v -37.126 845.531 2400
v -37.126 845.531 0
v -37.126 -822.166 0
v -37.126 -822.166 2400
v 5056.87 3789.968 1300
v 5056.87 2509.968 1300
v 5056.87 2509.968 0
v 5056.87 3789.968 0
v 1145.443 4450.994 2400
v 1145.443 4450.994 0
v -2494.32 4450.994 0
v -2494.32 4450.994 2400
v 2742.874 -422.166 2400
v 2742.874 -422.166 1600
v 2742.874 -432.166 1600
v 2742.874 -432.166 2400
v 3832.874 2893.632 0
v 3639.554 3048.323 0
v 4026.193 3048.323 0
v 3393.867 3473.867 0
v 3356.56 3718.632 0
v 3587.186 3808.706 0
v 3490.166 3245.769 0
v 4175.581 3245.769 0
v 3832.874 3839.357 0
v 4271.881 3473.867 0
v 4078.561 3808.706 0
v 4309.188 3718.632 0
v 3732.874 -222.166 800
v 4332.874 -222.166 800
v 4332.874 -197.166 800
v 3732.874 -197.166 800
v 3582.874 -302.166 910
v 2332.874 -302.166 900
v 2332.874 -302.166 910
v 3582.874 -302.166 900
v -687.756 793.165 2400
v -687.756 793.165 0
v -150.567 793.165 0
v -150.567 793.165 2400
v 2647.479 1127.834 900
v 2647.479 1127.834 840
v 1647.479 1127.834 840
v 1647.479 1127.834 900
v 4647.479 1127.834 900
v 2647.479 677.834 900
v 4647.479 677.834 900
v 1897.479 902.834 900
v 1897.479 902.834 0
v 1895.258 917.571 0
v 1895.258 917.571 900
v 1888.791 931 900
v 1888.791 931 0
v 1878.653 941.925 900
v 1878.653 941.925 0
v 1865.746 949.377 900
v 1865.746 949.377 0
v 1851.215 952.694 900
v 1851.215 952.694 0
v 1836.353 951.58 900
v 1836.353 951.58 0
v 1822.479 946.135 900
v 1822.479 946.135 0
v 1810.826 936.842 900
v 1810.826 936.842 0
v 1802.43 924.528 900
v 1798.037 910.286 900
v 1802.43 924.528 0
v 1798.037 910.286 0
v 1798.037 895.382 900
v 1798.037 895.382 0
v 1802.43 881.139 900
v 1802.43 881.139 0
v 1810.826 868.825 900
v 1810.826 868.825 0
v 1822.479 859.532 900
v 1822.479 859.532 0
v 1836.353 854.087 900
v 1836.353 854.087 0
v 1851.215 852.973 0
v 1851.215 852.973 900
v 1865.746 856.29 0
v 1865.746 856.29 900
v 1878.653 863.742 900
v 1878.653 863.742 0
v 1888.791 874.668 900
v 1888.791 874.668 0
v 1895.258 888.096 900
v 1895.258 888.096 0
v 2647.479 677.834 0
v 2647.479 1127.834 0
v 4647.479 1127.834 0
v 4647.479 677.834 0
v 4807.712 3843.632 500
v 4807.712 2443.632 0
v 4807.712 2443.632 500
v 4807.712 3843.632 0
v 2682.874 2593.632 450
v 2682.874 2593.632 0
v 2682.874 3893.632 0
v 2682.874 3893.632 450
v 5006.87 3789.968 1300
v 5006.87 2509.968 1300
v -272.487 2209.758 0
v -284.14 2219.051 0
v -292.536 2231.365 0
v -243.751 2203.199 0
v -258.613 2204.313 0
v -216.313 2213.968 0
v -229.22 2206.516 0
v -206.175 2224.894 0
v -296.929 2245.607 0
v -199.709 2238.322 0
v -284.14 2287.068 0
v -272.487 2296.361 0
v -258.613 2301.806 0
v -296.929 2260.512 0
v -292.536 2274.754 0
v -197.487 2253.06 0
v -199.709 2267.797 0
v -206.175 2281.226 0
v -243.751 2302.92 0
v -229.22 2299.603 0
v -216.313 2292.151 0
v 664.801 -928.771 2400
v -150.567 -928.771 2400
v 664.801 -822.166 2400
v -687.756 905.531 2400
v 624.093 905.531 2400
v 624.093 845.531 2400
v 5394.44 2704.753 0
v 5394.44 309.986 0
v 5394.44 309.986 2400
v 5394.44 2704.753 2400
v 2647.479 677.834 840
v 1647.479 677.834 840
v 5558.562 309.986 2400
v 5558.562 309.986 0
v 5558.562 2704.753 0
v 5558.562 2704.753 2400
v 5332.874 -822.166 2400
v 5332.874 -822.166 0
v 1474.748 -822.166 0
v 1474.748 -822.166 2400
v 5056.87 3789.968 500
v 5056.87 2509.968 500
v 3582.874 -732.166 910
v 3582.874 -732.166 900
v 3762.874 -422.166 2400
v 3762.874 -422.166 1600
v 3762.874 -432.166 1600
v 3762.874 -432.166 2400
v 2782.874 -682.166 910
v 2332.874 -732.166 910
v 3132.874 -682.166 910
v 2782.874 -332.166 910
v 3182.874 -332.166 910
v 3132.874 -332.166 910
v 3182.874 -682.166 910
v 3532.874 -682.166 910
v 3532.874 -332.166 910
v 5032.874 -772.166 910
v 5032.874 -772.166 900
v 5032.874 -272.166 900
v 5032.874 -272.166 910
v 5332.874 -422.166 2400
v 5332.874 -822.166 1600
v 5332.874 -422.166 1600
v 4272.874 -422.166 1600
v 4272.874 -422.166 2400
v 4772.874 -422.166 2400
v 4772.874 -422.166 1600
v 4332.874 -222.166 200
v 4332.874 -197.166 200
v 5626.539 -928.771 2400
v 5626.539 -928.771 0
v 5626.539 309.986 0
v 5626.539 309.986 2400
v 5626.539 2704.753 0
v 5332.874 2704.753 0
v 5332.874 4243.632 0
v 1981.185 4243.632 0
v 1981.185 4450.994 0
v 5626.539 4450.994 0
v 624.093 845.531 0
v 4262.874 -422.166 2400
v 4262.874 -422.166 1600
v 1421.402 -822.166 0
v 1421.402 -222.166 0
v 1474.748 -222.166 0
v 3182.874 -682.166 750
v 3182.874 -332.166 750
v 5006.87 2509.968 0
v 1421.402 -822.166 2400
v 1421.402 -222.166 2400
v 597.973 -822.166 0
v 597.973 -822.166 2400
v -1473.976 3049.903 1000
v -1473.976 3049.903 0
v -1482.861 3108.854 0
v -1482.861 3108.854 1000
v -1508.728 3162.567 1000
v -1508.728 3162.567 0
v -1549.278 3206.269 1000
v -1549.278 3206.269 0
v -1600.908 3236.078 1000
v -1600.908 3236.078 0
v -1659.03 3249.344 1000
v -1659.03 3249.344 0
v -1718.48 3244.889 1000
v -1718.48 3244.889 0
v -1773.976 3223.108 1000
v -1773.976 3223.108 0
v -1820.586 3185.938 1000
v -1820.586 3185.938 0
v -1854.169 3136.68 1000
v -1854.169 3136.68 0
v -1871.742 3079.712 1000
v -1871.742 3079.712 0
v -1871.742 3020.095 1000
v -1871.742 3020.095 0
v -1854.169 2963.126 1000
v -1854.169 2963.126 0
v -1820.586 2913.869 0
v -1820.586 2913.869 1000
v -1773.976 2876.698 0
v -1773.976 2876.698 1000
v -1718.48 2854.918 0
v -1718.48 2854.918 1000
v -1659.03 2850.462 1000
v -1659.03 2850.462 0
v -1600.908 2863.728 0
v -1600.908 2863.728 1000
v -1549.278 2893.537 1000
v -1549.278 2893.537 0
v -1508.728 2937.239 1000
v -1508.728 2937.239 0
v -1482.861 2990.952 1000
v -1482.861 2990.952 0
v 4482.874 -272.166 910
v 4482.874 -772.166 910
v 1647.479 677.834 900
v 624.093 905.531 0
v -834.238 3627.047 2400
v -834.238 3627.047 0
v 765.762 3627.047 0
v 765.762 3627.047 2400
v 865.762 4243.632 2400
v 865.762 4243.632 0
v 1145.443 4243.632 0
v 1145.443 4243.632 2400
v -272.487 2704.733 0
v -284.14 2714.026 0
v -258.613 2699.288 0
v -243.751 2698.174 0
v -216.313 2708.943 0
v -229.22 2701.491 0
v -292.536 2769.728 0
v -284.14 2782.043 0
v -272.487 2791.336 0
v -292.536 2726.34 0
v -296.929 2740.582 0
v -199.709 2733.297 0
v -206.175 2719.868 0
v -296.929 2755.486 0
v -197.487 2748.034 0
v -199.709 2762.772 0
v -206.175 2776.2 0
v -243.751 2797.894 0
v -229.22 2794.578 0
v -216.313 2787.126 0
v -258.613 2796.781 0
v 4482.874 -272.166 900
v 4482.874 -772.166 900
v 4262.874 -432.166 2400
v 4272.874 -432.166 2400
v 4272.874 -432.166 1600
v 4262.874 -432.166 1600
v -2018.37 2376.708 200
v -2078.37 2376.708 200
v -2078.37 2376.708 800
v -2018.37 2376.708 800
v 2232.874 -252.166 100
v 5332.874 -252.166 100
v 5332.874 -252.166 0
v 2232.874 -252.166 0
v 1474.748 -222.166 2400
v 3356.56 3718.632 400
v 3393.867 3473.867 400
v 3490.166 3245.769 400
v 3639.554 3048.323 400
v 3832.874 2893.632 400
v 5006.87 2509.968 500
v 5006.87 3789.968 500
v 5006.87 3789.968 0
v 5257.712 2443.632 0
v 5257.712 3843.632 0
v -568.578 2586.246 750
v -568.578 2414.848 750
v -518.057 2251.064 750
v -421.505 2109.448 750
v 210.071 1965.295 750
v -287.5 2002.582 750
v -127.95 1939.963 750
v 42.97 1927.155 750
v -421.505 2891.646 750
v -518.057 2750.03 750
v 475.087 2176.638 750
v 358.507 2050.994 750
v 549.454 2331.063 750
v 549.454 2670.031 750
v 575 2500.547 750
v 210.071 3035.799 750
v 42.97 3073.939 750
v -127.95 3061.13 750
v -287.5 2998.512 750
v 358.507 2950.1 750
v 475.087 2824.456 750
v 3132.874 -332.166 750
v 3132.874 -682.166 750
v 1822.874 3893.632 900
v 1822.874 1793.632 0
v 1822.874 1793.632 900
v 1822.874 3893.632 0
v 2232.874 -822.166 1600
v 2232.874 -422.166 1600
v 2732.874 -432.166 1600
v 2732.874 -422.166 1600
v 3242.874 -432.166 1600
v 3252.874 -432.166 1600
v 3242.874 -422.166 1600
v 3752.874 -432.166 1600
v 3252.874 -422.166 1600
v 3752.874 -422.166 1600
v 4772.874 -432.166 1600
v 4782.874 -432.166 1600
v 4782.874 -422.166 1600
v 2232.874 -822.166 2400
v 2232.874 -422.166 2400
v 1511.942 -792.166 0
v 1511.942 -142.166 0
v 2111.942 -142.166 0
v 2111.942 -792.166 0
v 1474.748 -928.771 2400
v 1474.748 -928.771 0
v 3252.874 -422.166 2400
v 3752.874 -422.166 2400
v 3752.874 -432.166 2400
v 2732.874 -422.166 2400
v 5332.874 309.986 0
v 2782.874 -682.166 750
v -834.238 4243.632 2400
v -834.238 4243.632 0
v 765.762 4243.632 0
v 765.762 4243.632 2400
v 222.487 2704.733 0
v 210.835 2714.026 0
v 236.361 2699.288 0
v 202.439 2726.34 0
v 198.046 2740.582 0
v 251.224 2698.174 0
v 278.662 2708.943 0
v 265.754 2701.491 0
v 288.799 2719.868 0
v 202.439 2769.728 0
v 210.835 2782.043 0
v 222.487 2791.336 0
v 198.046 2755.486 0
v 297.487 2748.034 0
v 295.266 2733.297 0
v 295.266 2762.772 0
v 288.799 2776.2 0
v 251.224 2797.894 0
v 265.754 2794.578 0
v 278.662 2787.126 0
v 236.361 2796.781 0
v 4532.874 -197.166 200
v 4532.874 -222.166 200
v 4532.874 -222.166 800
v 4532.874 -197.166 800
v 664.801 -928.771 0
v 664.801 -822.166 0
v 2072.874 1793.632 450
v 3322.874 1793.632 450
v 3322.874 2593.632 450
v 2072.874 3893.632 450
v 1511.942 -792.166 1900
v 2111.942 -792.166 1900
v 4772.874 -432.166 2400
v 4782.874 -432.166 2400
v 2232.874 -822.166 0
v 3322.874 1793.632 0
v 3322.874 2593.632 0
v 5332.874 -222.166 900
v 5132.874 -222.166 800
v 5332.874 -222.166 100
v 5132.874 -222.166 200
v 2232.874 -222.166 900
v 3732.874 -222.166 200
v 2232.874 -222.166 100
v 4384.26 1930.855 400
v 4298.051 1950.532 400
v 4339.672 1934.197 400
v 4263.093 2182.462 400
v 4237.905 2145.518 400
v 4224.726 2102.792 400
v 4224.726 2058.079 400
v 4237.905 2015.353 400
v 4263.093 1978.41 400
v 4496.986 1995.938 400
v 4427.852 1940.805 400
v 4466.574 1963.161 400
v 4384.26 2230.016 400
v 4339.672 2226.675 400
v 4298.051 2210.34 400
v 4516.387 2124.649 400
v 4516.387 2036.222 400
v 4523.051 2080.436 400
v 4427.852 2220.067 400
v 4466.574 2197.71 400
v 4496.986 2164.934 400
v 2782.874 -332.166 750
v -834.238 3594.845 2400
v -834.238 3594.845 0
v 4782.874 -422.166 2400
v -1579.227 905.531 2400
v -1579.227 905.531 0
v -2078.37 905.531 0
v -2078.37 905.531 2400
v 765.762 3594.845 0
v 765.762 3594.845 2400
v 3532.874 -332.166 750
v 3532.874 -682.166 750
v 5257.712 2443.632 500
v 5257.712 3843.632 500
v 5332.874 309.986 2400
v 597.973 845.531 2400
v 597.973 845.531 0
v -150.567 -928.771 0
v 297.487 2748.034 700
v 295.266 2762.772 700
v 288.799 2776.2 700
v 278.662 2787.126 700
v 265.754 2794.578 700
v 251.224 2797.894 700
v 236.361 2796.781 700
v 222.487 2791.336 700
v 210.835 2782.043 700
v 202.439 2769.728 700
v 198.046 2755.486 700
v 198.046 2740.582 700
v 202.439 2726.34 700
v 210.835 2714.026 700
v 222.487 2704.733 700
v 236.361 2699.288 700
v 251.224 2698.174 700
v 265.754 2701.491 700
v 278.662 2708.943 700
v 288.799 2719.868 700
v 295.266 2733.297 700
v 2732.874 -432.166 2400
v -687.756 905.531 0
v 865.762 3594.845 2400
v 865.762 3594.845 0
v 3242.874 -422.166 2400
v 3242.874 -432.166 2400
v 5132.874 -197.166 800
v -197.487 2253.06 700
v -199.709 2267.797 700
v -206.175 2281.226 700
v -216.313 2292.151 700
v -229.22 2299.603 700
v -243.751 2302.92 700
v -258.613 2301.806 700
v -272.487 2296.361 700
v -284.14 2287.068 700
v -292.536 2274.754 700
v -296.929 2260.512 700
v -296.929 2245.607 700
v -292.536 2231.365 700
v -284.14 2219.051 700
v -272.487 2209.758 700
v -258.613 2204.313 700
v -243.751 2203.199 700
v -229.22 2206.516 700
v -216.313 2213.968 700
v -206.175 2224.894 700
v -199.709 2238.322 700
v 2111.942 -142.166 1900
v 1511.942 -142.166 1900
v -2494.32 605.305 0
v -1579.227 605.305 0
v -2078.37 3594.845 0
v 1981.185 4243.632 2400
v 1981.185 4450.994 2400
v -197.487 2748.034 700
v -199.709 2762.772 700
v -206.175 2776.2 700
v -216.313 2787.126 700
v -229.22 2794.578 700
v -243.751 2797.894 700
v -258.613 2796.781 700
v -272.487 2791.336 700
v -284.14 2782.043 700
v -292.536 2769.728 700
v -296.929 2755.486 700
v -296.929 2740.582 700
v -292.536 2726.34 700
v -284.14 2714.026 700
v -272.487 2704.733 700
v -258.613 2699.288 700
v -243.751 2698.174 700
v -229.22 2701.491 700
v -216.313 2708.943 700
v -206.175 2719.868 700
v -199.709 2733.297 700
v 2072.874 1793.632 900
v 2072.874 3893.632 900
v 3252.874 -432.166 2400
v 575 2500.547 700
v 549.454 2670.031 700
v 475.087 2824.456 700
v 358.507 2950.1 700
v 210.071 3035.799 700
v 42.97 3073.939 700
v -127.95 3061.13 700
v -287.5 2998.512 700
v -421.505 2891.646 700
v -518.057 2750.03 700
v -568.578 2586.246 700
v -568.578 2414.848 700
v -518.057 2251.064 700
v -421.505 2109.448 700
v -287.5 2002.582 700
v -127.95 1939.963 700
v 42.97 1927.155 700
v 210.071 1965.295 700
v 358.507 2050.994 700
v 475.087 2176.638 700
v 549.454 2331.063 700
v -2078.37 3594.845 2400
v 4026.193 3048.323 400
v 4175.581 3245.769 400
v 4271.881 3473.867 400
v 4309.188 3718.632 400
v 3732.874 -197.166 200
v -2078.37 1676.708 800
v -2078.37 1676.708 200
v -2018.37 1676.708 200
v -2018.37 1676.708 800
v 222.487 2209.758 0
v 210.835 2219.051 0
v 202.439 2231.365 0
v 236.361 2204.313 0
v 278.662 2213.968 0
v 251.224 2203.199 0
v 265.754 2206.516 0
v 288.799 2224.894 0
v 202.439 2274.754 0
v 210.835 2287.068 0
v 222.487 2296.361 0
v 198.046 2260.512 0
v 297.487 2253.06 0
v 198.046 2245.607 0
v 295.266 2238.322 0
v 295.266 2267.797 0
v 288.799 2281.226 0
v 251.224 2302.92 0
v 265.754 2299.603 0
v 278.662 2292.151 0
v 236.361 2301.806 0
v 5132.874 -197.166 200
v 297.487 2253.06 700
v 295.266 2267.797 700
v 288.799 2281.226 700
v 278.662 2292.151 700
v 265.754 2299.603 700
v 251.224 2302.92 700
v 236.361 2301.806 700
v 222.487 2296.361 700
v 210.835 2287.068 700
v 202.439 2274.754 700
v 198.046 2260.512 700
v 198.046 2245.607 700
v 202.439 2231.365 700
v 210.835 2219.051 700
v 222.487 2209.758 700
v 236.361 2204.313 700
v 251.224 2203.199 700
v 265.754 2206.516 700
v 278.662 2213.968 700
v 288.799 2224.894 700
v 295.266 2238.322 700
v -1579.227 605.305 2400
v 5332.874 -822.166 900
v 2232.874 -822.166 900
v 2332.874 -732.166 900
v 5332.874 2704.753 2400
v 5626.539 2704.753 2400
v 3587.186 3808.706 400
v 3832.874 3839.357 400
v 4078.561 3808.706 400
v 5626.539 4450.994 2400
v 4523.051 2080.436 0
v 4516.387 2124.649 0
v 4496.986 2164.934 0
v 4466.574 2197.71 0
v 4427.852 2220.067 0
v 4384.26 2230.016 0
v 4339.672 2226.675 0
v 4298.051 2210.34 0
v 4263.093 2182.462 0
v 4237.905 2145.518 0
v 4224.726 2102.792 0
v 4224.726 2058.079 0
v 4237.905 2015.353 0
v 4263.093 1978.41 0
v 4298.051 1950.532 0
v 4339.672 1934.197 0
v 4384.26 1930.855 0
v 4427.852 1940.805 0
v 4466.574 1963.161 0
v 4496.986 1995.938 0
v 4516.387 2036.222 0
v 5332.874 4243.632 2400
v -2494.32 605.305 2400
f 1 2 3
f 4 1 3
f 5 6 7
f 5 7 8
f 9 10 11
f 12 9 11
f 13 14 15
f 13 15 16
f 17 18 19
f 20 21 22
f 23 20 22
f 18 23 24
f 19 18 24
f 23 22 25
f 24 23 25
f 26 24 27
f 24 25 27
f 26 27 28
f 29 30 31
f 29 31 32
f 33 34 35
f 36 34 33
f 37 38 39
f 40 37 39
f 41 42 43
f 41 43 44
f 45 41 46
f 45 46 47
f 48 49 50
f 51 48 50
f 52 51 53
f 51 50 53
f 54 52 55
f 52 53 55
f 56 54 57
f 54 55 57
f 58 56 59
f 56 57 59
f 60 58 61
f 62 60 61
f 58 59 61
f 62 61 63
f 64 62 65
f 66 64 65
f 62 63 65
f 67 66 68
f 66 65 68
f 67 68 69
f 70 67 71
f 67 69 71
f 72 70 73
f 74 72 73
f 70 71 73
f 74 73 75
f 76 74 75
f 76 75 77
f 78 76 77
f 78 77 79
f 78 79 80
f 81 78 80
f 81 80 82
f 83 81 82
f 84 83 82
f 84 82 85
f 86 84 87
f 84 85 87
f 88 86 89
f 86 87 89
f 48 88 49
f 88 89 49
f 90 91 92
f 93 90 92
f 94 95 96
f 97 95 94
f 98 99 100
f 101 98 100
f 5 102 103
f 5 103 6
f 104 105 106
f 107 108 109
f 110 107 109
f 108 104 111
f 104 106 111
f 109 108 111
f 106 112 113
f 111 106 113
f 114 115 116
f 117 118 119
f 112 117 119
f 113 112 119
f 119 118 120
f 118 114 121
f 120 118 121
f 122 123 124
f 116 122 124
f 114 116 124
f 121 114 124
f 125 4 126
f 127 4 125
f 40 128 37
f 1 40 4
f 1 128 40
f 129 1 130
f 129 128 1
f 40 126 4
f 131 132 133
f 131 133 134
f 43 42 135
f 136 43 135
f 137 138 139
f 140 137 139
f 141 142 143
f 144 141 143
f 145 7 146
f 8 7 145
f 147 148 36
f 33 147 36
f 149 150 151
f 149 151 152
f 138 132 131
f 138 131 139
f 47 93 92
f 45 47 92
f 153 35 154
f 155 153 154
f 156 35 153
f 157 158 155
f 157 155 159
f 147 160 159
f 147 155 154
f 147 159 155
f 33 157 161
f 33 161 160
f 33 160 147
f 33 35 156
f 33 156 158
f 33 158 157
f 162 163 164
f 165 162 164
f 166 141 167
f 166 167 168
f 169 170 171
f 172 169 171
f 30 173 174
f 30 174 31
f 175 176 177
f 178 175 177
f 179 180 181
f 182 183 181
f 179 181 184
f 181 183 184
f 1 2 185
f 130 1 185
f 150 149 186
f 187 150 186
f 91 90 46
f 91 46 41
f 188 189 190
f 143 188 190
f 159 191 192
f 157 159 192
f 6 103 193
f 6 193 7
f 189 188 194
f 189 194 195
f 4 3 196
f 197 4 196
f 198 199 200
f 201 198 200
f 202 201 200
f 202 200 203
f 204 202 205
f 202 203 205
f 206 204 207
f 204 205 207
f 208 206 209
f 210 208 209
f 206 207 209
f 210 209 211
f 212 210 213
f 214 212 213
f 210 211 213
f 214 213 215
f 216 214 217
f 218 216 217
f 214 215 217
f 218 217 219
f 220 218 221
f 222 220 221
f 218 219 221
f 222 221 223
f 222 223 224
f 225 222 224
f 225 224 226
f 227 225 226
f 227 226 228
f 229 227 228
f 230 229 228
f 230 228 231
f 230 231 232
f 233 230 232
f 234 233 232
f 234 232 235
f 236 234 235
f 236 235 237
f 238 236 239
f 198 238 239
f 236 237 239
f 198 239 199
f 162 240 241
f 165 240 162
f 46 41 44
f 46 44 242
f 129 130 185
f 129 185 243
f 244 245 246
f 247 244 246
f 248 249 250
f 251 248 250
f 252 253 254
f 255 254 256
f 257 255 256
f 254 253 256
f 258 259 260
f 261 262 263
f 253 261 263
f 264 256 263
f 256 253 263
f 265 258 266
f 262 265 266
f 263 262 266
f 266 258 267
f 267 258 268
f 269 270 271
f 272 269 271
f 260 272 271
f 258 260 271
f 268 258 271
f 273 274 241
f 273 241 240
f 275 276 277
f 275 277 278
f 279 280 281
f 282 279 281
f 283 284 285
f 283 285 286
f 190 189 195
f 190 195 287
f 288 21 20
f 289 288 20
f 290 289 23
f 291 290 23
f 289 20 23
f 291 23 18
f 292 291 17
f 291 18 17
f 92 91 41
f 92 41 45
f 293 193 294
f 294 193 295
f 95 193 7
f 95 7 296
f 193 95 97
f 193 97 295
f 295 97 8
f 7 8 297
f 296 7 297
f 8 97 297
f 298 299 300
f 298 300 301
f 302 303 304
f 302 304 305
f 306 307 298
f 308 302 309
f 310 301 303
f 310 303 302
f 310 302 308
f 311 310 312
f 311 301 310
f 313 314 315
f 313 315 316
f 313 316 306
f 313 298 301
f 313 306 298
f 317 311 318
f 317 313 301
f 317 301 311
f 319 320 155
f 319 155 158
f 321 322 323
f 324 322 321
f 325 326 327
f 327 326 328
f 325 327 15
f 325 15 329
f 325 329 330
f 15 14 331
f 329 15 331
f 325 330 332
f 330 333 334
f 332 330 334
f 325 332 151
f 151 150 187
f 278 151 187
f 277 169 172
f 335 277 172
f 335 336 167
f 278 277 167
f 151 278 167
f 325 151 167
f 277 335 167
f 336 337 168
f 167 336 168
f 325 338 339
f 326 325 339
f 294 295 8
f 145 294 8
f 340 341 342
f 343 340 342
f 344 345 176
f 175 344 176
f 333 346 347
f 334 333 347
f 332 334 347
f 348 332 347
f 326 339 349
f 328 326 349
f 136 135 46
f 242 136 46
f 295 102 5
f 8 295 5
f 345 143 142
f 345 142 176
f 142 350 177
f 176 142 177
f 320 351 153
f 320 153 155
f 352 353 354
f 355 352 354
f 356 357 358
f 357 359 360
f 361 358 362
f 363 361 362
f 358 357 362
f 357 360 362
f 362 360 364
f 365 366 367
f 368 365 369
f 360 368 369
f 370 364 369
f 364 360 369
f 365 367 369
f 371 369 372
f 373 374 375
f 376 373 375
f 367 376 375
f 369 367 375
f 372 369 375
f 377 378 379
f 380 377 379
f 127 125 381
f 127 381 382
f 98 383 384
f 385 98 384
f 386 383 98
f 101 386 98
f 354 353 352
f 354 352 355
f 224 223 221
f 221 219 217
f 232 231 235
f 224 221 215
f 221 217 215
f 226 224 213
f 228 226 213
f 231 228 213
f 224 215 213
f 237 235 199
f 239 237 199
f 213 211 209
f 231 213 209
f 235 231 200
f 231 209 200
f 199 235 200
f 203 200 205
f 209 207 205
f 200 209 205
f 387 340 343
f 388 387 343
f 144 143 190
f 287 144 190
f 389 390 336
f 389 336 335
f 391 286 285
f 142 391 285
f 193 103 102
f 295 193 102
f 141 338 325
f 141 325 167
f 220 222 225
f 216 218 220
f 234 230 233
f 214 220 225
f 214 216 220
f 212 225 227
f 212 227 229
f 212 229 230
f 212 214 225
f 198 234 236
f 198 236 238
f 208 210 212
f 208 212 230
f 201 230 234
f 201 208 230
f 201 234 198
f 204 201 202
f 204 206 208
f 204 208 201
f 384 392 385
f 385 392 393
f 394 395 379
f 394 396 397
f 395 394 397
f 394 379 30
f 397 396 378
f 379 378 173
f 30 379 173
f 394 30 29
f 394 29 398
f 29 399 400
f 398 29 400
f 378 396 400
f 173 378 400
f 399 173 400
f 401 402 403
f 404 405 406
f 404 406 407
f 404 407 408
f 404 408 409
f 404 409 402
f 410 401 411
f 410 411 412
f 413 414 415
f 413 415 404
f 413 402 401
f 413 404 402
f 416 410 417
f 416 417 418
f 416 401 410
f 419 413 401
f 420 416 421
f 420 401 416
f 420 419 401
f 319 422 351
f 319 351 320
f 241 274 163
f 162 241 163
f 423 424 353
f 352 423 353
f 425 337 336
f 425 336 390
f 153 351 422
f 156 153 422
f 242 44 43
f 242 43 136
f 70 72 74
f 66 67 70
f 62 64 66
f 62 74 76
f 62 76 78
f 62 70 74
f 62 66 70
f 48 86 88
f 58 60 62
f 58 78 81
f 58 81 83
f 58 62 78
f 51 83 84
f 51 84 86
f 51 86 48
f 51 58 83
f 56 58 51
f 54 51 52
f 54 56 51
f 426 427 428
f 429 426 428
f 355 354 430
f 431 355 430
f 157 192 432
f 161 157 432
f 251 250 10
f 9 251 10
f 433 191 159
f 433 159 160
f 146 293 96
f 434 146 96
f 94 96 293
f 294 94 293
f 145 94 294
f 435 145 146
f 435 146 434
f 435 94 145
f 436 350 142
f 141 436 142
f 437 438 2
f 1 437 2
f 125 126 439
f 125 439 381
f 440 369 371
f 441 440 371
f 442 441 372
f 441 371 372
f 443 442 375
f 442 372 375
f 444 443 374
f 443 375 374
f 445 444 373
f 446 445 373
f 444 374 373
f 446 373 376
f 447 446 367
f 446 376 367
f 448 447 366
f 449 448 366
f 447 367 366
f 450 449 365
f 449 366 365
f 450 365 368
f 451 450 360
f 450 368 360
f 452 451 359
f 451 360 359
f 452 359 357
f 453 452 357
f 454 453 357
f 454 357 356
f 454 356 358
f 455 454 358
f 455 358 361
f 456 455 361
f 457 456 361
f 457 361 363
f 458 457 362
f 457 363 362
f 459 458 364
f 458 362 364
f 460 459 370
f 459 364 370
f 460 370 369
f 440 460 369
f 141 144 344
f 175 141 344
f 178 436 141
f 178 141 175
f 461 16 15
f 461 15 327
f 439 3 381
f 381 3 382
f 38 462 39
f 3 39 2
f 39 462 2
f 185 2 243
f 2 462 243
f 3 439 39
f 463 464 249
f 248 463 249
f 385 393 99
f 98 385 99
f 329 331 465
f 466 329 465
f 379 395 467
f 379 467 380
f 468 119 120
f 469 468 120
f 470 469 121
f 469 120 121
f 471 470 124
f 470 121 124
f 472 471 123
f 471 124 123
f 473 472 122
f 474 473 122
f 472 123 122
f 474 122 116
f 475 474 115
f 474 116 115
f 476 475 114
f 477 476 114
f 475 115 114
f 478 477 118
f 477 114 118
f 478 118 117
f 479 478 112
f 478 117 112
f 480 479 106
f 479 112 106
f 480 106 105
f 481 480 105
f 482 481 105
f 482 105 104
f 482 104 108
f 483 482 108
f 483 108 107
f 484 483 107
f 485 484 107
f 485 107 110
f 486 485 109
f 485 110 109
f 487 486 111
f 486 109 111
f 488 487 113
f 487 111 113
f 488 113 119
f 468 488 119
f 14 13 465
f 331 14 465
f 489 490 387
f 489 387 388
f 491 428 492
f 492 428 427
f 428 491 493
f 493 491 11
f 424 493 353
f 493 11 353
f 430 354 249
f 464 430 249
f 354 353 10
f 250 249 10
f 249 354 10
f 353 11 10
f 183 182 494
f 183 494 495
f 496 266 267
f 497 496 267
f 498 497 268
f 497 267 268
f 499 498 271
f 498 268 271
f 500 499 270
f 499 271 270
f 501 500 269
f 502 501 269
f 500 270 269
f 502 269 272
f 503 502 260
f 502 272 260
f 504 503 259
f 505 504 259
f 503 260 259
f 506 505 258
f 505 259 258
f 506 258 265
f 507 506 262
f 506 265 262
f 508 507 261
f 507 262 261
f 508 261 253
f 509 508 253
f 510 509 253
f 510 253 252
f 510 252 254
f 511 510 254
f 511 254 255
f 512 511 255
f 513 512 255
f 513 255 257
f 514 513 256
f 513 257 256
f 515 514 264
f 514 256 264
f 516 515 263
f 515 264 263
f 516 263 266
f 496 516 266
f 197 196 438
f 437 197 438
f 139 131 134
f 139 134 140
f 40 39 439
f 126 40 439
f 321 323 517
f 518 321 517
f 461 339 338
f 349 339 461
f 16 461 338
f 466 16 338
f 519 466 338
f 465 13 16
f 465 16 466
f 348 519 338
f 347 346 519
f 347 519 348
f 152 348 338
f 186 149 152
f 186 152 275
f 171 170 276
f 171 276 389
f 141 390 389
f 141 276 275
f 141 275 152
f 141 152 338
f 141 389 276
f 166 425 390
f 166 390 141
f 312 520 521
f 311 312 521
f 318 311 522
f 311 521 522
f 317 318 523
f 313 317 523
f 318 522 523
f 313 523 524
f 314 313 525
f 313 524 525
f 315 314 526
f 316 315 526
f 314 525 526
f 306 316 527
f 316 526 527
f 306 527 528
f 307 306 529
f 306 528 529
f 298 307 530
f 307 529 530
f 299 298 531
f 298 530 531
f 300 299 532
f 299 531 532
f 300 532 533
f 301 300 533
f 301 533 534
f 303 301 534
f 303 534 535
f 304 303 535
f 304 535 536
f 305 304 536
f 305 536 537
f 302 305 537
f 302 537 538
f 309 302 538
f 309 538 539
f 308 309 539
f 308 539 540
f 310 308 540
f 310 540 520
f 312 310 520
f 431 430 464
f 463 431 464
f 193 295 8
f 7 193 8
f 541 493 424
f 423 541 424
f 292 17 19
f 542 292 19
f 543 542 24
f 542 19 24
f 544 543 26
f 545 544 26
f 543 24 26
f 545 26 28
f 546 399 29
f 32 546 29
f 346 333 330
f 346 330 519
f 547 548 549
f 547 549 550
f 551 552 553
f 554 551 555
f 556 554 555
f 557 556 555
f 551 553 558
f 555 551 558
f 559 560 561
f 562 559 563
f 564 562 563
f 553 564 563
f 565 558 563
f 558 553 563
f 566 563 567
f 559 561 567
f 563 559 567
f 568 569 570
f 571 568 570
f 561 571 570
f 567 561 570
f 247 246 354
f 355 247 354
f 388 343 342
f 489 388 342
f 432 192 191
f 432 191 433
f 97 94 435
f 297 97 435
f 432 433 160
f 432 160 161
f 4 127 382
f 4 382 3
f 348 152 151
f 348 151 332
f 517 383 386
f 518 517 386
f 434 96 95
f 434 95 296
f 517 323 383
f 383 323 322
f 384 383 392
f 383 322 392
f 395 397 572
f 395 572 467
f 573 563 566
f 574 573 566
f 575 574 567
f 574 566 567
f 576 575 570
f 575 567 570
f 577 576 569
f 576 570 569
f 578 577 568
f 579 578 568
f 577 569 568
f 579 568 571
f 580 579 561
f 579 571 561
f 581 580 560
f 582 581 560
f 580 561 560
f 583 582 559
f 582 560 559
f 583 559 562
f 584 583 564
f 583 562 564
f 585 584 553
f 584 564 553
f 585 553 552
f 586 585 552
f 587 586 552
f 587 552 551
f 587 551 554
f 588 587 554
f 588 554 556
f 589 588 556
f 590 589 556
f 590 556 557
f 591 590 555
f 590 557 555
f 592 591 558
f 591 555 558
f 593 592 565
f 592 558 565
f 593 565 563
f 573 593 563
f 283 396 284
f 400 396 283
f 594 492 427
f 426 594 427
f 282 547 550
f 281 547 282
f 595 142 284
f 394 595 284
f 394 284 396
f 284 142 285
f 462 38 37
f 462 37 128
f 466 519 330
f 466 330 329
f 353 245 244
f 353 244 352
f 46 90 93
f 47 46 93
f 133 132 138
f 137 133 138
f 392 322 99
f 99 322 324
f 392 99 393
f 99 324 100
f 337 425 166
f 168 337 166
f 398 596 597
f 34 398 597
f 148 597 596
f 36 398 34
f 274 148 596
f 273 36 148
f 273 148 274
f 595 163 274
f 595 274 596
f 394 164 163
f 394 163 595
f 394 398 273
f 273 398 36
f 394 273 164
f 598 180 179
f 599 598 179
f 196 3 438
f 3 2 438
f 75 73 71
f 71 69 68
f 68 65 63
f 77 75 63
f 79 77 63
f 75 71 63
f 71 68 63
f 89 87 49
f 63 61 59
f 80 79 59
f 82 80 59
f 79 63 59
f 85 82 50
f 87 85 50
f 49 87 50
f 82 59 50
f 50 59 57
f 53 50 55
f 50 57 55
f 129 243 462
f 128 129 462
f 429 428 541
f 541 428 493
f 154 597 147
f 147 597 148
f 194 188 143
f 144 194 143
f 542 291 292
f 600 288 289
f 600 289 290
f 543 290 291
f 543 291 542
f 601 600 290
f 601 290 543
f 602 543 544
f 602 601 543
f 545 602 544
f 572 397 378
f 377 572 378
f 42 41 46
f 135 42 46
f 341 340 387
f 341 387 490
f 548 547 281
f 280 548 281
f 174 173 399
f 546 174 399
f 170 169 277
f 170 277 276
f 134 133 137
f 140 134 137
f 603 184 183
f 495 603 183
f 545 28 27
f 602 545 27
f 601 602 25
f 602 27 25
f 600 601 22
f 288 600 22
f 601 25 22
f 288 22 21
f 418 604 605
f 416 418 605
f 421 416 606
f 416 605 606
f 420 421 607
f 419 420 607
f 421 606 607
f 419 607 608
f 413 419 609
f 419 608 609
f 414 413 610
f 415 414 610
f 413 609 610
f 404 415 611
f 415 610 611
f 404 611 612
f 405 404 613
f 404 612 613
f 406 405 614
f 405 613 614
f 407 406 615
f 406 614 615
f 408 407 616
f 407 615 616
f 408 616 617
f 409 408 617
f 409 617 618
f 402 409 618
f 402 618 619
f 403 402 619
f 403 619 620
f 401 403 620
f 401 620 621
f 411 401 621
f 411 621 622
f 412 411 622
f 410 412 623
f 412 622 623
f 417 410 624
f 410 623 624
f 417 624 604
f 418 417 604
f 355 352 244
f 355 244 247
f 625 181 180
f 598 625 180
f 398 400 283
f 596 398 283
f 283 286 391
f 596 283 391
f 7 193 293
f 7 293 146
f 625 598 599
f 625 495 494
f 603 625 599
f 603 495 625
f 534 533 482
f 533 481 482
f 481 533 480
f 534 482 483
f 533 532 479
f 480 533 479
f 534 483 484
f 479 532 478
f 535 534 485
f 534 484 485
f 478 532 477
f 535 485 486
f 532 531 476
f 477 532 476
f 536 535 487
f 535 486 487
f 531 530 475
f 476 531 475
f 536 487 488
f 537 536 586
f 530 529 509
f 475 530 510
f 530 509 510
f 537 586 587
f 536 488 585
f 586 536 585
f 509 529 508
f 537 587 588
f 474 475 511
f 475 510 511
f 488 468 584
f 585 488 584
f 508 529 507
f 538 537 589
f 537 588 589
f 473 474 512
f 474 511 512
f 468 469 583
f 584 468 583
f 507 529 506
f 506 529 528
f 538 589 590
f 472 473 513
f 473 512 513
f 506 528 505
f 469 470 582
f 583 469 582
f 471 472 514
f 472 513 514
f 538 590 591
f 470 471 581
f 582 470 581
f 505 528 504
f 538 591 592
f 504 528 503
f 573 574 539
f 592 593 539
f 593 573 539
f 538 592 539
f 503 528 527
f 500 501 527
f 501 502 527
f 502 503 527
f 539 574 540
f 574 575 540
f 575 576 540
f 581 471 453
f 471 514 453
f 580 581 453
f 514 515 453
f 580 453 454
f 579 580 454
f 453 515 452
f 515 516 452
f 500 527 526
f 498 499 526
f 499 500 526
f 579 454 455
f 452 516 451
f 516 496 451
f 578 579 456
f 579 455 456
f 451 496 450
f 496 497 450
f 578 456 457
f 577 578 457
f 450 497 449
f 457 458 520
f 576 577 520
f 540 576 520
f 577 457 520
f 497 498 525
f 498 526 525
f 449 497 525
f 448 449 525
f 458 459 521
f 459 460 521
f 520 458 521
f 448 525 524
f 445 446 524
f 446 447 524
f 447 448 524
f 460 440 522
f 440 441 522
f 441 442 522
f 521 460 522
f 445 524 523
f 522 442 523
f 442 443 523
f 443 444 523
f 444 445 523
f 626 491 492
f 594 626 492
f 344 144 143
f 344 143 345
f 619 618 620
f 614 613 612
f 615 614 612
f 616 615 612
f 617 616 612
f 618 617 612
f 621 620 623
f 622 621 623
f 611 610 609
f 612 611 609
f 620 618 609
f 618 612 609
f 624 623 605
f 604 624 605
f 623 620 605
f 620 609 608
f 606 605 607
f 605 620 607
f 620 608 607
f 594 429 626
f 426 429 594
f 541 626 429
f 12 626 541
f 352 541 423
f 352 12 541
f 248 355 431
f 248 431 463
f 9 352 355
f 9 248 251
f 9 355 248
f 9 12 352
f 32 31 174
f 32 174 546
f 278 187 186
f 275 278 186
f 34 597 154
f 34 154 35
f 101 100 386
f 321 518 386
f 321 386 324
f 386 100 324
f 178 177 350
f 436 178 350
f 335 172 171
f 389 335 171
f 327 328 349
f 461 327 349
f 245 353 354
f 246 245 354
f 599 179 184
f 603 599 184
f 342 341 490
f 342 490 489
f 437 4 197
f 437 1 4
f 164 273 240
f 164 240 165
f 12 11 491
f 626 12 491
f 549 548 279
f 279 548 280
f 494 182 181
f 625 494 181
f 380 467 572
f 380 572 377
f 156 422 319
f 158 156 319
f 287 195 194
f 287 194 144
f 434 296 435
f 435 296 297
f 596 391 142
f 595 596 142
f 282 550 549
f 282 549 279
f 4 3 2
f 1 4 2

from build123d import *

# Parameters (mm, degrees)
F0_W      = 3351.6886112094
F0_H      = 207.362651825
F1_DEPTH  = 2400
F0_W_2    = 537.1888577938
F0_H_2    = 112.3662590981
F0_W_3    = 53.346157074
F0_H_3    = 600
F0_W_4    = 1250
F0_H_4    = 430
F0_W_5    = 550
F0_H_5    = 500
F2_DEPTH  = 900
F0_W_6    = 2000
F0_H_6    = 450
F0_R      = 50
F3_W      = 3100
F3_H      = 400
F4_DEPTH  = 800
F0_W_7    = 600
F0_H_7    = 650
F5_DEPTH  = 1900
F0_W_8    = 250
F0_H_8    = 2100
F6_DEPTH  = 900
F7_DEPTH  = 450
F0_W_9    = 350
F0_H_9    = 350
F8_DEPTH  = 910
F9_DEPTH  = 750
F10_DEPTH = 910
F11_W     = 450
F11_H     = 60
F12_DEPTH = 1000
F0_W_10   = 164.1221046448
F0_H_10   = 2394.7671353817
F13_DEPTH = 2400
F0_R_2    = 575
F14_DEPTH = 750
F15_DEPTH = 700
F17_DEPTH = 400
F0_R_3    = 150
F18_W     = 600
F18_H     = 600
F19_DEPTH = 25
F18_W_2   = 3100
F18_H_2   = 100
F20_DEPTH = 30
F21_W     = 10
F21_H     = 800
F22_DEPTH = 10
F23_W     = 700
F23_H     = 600
F24_DEPTH = 60
F0_W_11   = 1600
F0_H_11   = 616.584777832
F25_DEPTH = 2400
F0_R_4    = 200
F26_DEPTH = 1000
F0_W_12   = 450
F0_H_12   = 1400
F0_W_13   = 50
F0_H_13   = 1280
F27_DEPTH = 500
F28_DEPTH = 1300


# Not quite as in the source:
# - a feature names something its author has since deleted; it is built from what else it names


with BuildPart() as f1:
    # F0 (on Top) → F1 (new body)
    with BuildSketch(Plane.XY):
        Polygon((5332.8738090396, 2704.7533988953), (5394.4396972656, 2704.7533988953), (5558.5618019104, 2704.7533988953), (5626.5387535095, 2704.7533988953), (5626.5387535095, 4450.9944915771), (5332.8738090396, 4450.9944915771), (5332.8738090396, 4243.6318397522), align=None)
        with Locations((3657.0295034349, 4347.3131656647)):
            Rectangle(F0_W, F0_H)
    extrude(amount=F1_DEPTH)


with BuildPart() as f1b:
    # F0 (on Top) → F1, piece 2 (new body)
    with BuildSketch(Plane.XY):
        Polygon((5332.8738090396, -222.1663832664), (5332.8738090396, -822.1663832664), (2232.8738090396, -822.1663832664), (1474.7484922409, -822.1663832664), (1474.7484922409, -928.7706017494), (5626.5387535095, -928.7706017494), (5626.5387535095, 309.9862635136), (5558.5618019104, 309.9862635136), (5394.4396972656, 309.9862635136), (5332.8738090396, 309.9862635136), align=None)
    extrude(amount=F1_DEPTH)


with BuildPart() as f1c:
    # F0 (on Top) → F1, piece 3 (new body)
    with BuildSketch(Plane.XY):
        Polygon((597.9725122452, -822.1663832664), (-37.1261909604, -822.1663832664), (-37.1261909604, -26.347534731), (-37.1261909604, 845.5312275887), (-37.1261909604, 905.5312275887), (-150.5666673183, 905.5312275887), (-150.5666673183, 793.1649684906), (-150.5666673183, -928.7706017494), (664.8011207581, -928.7706017494), (664.8011207581, -822.1663832664), align=None)
        with Locations((-419.1610962152, 849.3480980396)):
            Rectangle(F0_W_2, F0_H_2)
        Polygon((-37.1261909604, 845.5312275887), (597.9725122452, 845.5312275887), (624.0934729576, 845.5312275887), (624.0934729576, 905.5312275887), (597.9725122452, 905.5312275887), (-37.1261909604, 905.5312275887), align=None)
    extrude(amount=F1_DEPTH)


with BuildPart() as f1d:
    # F0 (on Top) → F1, piece 4 (new body)
    with BuildSketch(Plane.XY):
        with Locations((1448.0754137039, -522.1663832664)):
            Rectangle(F0_W_3, F0_H_3)
    extrude(amount=F1_DEPTH)


with BuildPart() as f1e:
    # F0 (on Top) → F1, piece 5 (new body)
    with BuildSketch(Plane.XY):
        Polygon((865.7621264458, 4243.6318397522), (1145.4427242279, 4243.6318397522), (1145.4427242279, 4450.9944915771), (-2494.3199157715, 4450.9944915771), (-2494.3199157715, 605.3053736687), (-1579.2272090912, 605.3053736687), (-1579.2272090912, 905.5312275887), (-2078.3698558807, 905.5312275887), (-2078.3698558807, 3594.8448181152), (-834.2378735542, 3594.8448181152), (-834.2378735542, 3627.0470619202), (-834.2378735542, 4243.6318397522), (765.7621264458, 4243.6318397522), align=None)
        Polygon((865.7621264458, 3594.8448181152), (865.7621264458, 4243.6318397522), (765.7621264458, 4243.6318397522), (765.7621264458, 3627.0470619202), (765.7621264458, 3594.8448181152), align=None)
    extrude(amount=F1_DEPTH)


with BuildPart() as f2:
    # F0 (on Top) → F2 (new body)
    with BuildSketch(Plane.XY):
        Polygon((2232.8738090396, -822.1663832664), (5332.8738090396, -822.1663832664), (5332.8738090396, -222.1663832664), (4732.8738090396, -222.1663832664), (2232.8738090396, -222.1663832664), align=None)
        with Locations((2957.8738090396, -517.1663832664)):
            Rectangle(F0_W_4, F0_H_4, mode=Mode.SUBTRACT)
        with Locations((4757.8738090396, -522.1663832664)):
            Rectangle(F0_W_5, F0_H_5, mode=Mode.SUBTRACT)
    extrude(amount=F2_DEPTH)

    # F0 (on Top) → F8 (join)
    with BuildSketch(Plane.XY):
        with Locations((2957.8738090396, -517.1663832664)):
            Rectangle(F0_W_4, F0_H_4)
        with Locations((2957.8738090396, -507.1663832664)):
            Rectangle(F0_W_9, F0_H_9, mode=Mode.SUBTRACT)
        with Locations((3357.8738090396, -507.1663832664)):
            Rectangle(F0_W_9, F0_H_9, mode=Mode.SUBTRACT)
    extrude(amount=F8_DEPTH)

    # F0 (on Top) → F9 (join)
    with BuildSketch(Plane.XY):
        with Locations((3357.8738090396, -507.1663832664)):
            Rectangle(F0_W_9, F0_H_9)
        with Locations((2957.8738090396, -507.1663832664)):
            Rectangle(F0_W_9, F0_H_9)
    extrude(amount=F9_DEPTH)

    # F0 (on Top) → F10 (join)
    with BuildSketch(Plane.XY):
        with Locations((4757.8738090396, -522.1663832664)):
            Rectangle(F0_W_5, F0_H_5)
    extrude(amount=F10_DEPTH)

    # F18 (on face) → F19 (join)
    with BuildSketch(Plane(origin=(0, -222.1663832664, 0), x_dir=(-1, 0, 0), z_dir=(0, 1, 0))):
        with Locations((-4832.8738090396, 500)):
            Rectangle(F18_W, F18_H)
        with Locations((-4032.8738090396, 500)):
            Rectangle(F18_W, F18_H)
    extrude(amount=F19_DEPTH)

    # F18 (on face) → F20 (cut)
    with BuildSketch(Plane(origin=(0, -222.1663832664, 0), x_dir=(-1, 0, 0), z_dir=(0, 1, 0))):
        with Locations((-3782.8738090396, 50)):
            Rectangle(F18_W_2, F18_H_2)
    extrude(amount=-F20_DEPTH, mode=Mode.SUBTRACT)


with BuildPart() as f2b:
    # F0 (on Top) → F2, piece 2 (new body)
    with BuildSketch(Plane.XY):
        with Locations((3647.4789381027, 902.8336167336)):
            Rectangle(F0_W_6, F0_H_6)
    extrude(amount=F2_DEPTH)


with BuildPart() as f2c:
    # F0 (on Top) → F2, piece 3 (new body)
    with BuildSketch(Plane.XY):
        with Locations((1847.4789381027, 902.8336167336)):
            Circle(F0_R)
    extrude(amount=F2_DEPTH)


with BuildPart() as f4:
    # F3 (on face) → F4 (new body)
    with BuildSketch(Plane.XY.offset(2400)):
        with Locations((3782.8738090396, -622.1663832664)):
            Rectangle(F3_W, F3_H)
    extrude(amount=-F4_DEPTH)

    # F21 (on face) → F22 (cut)
    with BuildSketch(Plane(origin=(0, -422.1663832664, 0), x_dir=(-1, 0, 0), z_dir=(0, 1, 0))):
        with Locations((-2737.8738090396, 2000)):
            Rectangle(F21_W, F21_H)
        with Locations((-3247.8738090396, 2000)):
            Rectangle(F21_W, F21_H)
        with Locations((-3757.8738090396, 2000)):
            Rectangle(F21_W, F21_H)
        with Locations((-4267.8738090396, 2000)):
            Rectangle(F21_W, F21_H)
        with Locations((-4777.8738090396, 2000)):
            Rectangle(F21_W, F21_H)
    extrude(amount=-F22_DEPTH, mode=Mode.SUBTRACT)


with BuildPart() as f5:
    # F0 (on Top) → F5 (new body)
    with BuildSketch(Plane.XY):
        with Locations((1811.9415521622, -467.1663832664)):
            Rectangle(F0_W_7, F0_H_7)
    extrude(amount=F5_DEPTH)


with BuildPart() as f6:
    # F0 (on Top) → F6 (new body)
    with BuildSketch(Plane.XY):
        with Locations((1947.8738090396, 2843.6318397522)):
            Rectangle(F0_W_8, F0_H_8)
    extrude(amount=F6_DEPTH)

    # F0 (on Top) → F7 (join)
    with BuildSketch(Plane.XY):
        Polygon((2072.8738090396, 3893.6318397522), (2072.8738090396, 1793.6318397522), (3322.8738090396, 1793.6318397522), (3322.8738090396, 2593.6318397522), (2682.8738090396, 2593.6318397522), (2682.8738090396, 3893.6318397522), align=None)
    extrude(amount=F7_DEPTH)


with BuildPart() as f12:
    # F11 (on face) → F12 (new body)
    with BuildSketch(Plane(origin=(2647.4789381027, 0, 0), x_dir=(0, -1, 0), z_dir=(-1, 0, 0))):
        with Locations((-902.8336167336, 870)):
            Rectangle(F11_W, F11_H)
    extrude(amount=F12_DEPTH)


with BuildPart() as f13:
    # F0 (on Top) → F13 (new body)
    with BuildSketch(Plane.XY):
        with Locations((5476.500749588, 1507.3698312044)):
            Rectangle(F0_W_10, F0_H_10)
    extrude(amount=F13_DEPTH)


with BuildPart() as f14:
    # F0 (on Top) → F14 (new body)
    with BuildSketch(Plane.XY):
        with Locations((0, 2500.5469322205)):
            Circle(F0_R_2)
        with Locations((-247.4873734153, 2253.0595588052)):
            Circle(F0_R, mode=Mode.SUBTRACT)
        with Locations((247.4873734153, 2253.0595588052)):
            Circle(F0_R, mode=Mode.SUBTRACT)
        with Locations((-247.4873734153, 2748.0343056358)):
            Circle(F0_R, mode=Mode.SUBTRACT)
        with Locations((247.4873734153, 2748.0343056358)):
            Circle(F0_R, mode=Mode.SUBTRACT)
        with Locations((247.4873734153, 2748.0343056358)):
            Circle(F0_R)
        with Locations((247.4873734153, 2253.0595588052)):
            Circle(F0_R)
        with Locations((-247.4873734153, 2748.0343056358)):
            Circle(F0_R)
        with Locations((-247.4873734153, 2253.0595588052)):
            Circle(F0_R)
    extrude(amount=F14_DEPTH)


with BuildPart() as f15:
    # F0 (on Top) → F15 (new body)
    with BuildSketch(Plane.XY):
        with Locations((0, 2500.5469322205)):
            Circle(F0_R_2)
        with Locations((-247.4873734153, 2253.0595588052)):
            Circle(F0_R, mode=Mode.SUBTRACT)
        with Locations((247.4873734153, 2253.0595588052)):
            Circle(F0_R, mode=Mode.SUBTRACT)
        with Locations((-247.4873734153, 2748.0343056358)):
            Circle(F0_R, mode=Mode.SUBTRACT)
        with Locations((247.4873734153, 2748.0343056358)):
            Circle(F0_R, mode=Mode.SUBTRACT)
    extrude(amount=F15_DEPTH)


with BuildPart() as f14_1:
    add(f14.part)

    # F16: cut F15
    add(f15.part, mode=Mode.SUBTRACT)


with BuildPart() as f17:
    # F0 (on Top) → F17 (new body)
    with BuildSketch(Plane.XY):
        with BuildLine():
            ThreePointArc((3356.5598369582, 3718.6318397522), (3490.1661397403, 3245.7694746289), (3832.8738090396, 2893.6318397522))
            ThreePointArc((3832.8738090396, 2893.6318397522), (4175.5814783389, 3245.7694746289), (4309.187781121, 3718.6318397522))
            ThreePointArc((4309.187781121, 3718.6318397522), (3832.8738090396, 3839.3565699987), (3356.5598369582, 3718.6318397522))
        make_face()
    extrude(amount=F17_DEPTH)


with BuildPart() as f17b:
    # F0 (on Top) → F17, piece 2 (new body)
    with BuildSketch(Plane.XY):
        with Locations((4373.0506326787, 2080.4357423588)):
            Circle(F0_R_3)
    extrude(amount=F17_DEPTH)


with BuildPart() as f24:
    # F23 (on face) → F24 (new body)
    with BuildSketch(Plane.YZ.offset(-2078.3698558807)):
        with Locations((2026.7077445984, 500)):
            Rectangle(F23_W, F23_H)
    extrude(amount=F24_DEPTH)


with BuildPart() as f25:
    # F0 (on Top) → F25 (new body)
    with BuildSketch(Plane.XY):
        with Locations((-34.2378735542, 3935.3394508362)):
            Rectangle(F0_W_11, F0_H_11)
    extrude(amount=F25_DEPTH)


with BuildPart() as f25b:
    # F0 (on Top) → F25, piece 2 (new body)
    with BuildSketch(Plane.XY):
        Polygon((-37.1261909604, -26.347534731), (-37.1261909604, -822.1663832664), (597.9725122452, -822.1663832664), (597.9725122452, 845.5312275887), (-37.1261909604, 845.5312275887), align=None)
    extrude(amount=F25_DEPTH)


with BuildPart() as f26:
    # F0 (on Top) → F26 (new body)
    with BuildSketch(Plane.XY):
        with Locations((-1673.9757061005, 3049.9031543732)):
            Circle(F0_R_4)
    extrude(amount=F26_DEPTH)


with BuildPart() as f27:
    # F0 (on Top) → F27 (new body)
    with BuildSketch(Plane.XY):
        with Locations((5032.7116012573, 3143.6318397522)):
            Rectangle(F0_W_12, F0_H_12)
        with Locations((5031.8699836731, 3149.9679946899)):
            Rectangle(F0_W_13, F0_H_13, mode=Mode.SUBTRACT)
    extrude(amount=F27_DEPTH)


with BuildPart() as f28:
    # F0 (on Top) → F28 (new body)
    with BuildSketch(Plane.XY):
        with Locations((5031.8699836731, 3149.9679946899)):
            Rectangle(F0_W_13, F0_H_13)
    extrude(amount=F28_DEPTH)


solid = Compound([f1.part, f1b.part, f1c.part, f1d.part, f1e.part, f2.part, f2b.part, f2c.part, f4.part, f5.part, f6.part, f12.part, f13.part, f14_1.part, f17.part, f17b.part, f24.part, f25.part, f25b.part, f26.part, f27.part, f28.part])
